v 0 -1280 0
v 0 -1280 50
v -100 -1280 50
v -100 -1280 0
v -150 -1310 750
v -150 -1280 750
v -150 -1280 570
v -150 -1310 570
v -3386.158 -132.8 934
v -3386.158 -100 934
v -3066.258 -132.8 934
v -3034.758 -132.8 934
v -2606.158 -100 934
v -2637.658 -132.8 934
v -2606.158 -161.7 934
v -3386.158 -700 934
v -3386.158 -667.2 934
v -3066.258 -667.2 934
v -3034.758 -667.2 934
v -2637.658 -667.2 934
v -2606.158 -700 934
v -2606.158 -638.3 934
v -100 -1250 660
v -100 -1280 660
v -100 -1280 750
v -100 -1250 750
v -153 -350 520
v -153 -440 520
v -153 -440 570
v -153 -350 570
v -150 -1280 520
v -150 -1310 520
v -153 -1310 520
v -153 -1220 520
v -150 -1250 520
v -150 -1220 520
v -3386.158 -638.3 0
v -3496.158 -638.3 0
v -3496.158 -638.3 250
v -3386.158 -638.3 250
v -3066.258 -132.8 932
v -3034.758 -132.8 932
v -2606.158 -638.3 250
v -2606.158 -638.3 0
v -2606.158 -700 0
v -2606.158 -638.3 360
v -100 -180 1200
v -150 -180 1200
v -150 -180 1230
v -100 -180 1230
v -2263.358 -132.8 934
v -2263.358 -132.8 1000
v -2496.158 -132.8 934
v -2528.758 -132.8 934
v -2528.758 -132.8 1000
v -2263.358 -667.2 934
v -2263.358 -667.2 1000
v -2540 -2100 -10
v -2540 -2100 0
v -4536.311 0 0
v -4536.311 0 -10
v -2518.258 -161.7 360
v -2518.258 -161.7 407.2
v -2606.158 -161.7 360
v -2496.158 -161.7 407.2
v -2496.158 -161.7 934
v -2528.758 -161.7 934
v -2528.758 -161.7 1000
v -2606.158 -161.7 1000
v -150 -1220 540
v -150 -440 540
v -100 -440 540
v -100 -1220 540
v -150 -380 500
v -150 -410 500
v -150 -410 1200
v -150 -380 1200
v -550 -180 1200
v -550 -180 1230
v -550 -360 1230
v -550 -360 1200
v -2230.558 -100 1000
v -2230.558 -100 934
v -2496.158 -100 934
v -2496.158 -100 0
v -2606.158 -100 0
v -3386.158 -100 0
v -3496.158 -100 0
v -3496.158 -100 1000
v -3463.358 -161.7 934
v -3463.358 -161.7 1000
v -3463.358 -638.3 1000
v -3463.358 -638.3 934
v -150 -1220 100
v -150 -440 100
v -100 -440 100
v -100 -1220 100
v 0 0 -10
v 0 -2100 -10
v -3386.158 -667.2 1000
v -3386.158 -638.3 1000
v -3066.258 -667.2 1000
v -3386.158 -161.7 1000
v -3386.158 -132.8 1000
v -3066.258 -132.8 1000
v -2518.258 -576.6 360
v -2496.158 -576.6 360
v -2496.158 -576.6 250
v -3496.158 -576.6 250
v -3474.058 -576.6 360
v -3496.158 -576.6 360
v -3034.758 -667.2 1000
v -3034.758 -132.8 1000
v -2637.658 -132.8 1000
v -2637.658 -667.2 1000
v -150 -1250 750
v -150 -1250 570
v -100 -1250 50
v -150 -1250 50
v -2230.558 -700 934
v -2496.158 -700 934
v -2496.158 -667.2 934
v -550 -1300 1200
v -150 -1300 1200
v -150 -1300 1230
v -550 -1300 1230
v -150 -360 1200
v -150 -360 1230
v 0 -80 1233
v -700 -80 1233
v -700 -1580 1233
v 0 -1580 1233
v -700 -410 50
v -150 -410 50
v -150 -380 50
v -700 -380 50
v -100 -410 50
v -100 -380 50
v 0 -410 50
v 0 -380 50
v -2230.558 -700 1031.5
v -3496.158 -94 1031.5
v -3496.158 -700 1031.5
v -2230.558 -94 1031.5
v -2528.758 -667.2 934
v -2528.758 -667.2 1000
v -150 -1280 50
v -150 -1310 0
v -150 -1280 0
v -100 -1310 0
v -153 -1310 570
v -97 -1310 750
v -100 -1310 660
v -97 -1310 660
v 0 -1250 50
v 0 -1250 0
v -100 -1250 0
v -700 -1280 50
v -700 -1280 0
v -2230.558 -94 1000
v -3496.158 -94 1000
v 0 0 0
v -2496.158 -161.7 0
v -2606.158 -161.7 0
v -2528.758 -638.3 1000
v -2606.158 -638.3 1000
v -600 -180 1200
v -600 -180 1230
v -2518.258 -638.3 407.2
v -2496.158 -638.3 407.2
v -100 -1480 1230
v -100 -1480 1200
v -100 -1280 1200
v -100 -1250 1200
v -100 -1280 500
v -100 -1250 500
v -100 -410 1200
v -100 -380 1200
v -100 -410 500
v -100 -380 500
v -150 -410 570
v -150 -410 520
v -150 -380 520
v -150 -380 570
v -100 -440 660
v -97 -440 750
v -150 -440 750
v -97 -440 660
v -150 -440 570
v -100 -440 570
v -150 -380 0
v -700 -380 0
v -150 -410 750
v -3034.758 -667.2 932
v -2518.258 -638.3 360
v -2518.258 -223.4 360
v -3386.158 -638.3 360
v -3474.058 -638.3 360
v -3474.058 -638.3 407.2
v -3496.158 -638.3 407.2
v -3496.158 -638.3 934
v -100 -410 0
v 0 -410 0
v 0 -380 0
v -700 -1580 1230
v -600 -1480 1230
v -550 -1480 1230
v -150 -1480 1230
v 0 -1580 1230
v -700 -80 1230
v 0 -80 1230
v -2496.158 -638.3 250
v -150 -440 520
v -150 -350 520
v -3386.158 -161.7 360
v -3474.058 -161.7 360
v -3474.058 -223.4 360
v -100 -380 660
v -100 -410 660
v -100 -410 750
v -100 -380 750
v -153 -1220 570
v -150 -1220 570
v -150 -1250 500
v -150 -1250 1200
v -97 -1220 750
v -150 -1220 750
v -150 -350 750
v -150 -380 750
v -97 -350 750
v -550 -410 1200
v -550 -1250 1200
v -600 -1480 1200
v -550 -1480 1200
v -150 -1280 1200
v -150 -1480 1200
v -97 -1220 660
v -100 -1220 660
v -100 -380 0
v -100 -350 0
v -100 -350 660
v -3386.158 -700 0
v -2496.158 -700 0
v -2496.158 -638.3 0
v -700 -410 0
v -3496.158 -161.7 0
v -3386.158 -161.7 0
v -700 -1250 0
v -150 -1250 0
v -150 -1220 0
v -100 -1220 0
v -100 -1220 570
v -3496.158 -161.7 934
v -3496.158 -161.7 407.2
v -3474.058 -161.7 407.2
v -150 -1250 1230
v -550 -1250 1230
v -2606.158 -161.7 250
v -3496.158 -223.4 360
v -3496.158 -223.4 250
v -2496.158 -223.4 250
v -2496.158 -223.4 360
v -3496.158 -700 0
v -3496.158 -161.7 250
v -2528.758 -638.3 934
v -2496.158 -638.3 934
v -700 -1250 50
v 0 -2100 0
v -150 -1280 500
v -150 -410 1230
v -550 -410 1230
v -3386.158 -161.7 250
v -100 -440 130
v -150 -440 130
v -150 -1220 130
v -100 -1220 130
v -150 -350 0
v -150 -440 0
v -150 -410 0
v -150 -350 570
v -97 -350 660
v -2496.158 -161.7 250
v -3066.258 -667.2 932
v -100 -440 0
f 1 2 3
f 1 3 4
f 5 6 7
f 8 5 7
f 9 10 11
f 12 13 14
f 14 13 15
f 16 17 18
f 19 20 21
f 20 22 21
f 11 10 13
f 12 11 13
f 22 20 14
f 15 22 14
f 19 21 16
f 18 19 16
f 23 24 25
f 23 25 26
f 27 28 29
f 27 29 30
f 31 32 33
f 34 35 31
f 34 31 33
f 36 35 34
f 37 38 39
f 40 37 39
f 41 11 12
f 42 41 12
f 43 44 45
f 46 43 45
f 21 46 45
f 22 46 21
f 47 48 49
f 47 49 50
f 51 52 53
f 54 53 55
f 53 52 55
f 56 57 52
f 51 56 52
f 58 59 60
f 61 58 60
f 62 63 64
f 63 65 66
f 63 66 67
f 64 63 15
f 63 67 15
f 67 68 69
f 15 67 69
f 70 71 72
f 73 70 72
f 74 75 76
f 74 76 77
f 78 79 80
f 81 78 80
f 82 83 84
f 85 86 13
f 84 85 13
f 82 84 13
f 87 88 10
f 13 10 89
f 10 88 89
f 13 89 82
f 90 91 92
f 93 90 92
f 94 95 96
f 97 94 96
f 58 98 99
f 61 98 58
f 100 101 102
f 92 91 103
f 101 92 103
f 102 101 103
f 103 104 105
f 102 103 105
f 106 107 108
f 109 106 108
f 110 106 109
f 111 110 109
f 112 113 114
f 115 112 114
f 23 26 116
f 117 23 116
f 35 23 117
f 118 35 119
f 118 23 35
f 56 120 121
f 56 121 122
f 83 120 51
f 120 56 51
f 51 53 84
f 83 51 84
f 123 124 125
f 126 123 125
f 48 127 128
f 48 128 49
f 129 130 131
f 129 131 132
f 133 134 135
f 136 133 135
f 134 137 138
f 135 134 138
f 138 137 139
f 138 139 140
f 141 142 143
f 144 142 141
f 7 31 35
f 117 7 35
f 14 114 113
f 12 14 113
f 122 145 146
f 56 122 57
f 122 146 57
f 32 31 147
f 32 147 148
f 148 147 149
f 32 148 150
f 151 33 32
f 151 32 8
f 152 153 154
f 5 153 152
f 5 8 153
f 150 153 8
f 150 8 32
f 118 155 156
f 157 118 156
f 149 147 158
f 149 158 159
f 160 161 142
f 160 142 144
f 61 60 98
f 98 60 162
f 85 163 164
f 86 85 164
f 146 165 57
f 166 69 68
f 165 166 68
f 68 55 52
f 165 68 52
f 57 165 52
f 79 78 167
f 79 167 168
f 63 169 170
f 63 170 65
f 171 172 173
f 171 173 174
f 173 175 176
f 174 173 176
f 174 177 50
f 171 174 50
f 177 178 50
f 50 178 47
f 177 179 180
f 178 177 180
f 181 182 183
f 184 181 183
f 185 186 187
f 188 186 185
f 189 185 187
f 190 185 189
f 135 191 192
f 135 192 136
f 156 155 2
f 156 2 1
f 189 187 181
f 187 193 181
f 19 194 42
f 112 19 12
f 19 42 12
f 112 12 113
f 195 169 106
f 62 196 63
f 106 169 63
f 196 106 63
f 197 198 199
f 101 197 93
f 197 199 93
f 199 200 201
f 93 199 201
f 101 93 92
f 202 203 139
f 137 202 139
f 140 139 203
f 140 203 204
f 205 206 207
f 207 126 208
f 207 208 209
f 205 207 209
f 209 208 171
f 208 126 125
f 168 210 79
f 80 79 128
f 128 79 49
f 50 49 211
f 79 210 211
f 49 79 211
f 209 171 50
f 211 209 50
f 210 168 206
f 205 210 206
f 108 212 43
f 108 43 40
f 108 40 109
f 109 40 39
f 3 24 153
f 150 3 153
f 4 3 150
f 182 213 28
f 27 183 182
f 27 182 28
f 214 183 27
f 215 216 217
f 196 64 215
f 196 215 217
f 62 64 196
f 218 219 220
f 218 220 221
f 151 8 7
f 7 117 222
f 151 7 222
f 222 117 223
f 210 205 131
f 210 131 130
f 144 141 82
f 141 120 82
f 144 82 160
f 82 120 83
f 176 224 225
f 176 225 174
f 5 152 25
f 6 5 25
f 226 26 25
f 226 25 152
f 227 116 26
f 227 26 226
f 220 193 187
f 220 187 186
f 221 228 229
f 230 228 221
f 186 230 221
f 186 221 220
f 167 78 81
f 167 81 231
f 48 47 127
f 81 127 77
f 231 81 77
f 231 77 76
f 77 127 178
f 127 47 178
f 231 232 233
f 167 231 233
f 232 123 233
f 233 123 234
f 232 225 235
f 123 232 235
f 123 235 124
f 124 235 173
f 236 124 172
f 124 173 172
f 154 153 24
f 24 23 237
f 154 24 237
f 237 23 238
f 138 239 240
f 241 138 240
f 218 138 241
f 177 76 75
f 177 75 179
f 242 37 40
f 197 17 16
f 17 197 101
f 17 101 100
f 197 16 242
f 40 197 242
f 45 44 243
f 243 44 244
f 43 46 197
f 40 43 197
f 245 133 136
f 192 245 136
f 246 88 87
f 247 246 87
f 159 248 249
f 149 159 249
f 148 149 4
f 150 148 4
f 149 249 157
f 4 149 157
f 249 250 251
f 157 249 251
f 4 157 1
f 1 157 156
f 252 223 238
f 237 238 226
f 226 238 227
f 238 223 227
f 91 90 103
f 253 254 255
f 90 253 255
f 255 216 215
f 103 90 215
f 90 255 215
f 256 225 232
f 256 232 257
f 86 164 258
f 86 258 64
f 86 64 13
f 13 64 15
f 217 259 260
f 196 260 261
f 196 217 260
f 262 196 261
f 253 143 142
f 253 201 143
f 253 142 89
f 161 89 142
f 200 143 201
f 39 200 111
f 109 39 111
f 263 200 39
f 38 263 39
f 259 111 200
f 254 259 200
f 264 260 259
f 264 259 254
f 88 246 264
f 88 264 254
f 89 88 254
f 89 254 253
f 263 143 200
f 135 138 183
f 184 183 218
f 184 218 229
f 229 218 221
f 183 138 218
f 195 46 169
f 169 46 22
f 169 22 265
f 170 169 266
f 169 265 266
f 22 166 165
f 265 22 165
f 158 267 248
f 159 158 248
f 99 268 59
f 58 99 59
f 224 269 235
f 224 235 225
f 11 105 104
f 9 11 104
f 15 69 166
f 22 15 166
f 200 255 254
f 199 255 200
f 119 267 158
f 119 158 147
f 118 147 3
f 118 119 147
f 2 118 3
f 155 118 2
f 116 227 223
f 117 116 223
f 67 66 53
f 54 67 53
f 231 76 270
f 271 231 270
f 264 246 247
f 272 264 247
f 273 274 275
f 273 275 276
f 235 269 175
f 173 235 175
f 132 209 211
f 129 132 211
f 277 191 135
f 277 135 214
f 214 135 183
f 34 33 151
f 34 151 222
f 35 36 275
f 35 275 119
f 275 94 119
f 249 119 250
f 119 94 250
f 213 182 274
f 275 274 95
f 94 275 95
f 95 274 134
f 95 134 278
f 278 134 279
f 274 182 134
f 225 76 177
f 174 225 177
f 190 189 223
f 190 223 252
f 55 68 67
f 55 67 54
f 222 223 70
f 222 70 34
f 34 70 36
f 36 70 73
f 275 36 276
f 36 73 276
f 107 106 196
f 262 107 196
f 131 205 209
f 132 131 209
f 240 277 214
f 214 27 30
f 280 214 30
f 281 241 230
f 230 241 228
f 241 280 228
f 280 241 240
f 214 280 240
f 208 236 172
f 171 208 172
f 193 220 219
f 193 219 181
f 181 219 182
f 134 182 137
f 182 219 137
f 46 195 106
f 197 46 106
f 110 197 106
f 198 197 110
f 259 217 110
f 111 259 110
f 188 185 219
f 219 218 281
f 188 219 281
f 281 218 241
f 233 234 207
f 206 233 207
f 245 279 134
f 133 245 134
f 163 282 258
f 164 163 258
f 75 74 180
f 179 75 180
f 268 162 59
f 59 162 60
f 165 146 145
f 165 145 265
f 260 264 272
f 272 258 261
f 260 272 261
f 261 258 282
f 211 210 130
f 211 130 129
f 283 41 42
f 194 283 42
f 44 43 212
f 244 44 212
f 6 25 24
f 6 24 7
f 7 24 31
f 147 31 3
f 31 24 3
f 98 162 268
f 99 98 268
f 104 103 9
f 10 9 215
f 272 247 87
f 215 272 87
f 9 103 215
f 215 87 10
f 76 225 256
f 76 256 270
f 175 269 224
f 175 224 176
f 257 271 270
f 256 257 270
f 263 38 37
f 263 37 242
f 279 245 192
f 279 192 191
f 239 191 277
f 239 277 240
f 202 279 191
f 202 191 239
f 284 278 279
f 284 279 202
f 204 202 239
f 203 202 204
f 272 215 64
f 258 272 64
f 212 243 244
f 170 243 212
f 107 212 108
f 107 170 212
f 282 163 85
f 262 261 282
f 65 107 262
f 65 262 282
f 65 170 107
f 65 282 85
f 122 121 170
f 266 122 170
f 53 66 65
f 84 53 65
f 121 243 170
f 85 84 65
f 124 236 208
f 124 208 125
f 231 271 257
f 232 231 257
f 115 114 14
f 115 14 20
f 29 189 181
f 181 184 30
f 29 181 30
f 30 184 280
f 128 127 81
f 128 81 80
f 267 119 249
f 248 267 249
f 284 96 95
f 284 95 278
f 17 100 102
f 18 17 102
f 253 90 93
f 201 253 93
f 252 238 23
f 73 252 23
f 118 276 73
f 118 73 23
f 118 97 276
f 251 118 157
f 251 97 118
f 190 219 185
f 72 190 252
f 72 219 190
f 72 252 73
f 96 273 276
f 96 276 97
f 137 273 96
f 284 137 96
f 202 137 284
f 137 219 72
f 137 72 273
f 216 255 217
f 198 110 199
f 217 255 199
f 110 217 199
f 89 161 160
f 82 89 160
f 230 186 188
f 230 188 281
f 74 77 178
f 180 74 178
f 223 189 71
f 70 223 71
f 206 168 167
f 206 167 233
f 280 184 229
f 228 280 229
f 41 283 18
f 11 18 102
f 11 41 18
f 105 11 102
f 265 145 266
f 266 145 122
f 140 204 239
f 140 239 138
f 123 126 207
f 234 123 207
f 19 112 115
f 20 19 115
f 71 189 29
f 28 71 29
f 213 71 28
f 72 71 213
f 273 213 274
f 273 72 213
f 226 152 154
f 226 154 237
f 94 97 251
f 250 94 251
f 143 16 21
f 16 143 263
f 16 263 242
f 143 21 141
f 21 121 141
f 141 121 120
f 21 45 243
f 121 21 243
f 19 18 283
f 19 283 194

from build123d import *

# Parameters (mm, degrees)
PAD015_DEPTH    = 10
SKETCH001_W     = 30
SKETCH001_H     = 50
PAD_DEPTH       = 700
SKETCH002_W     = 750
SKETCH002_H     = 50
PAD001_DEPTH    = 30
SKETCH003_W     = 750
SKETCH003_H     = 50
PAD002_DEPTH    = 30
SKETCH004_W     = 30
SKETCH004_H     = 50
PAD003_DEPTH    = 780
SKETCH005_W     = 750
SKETCH005_H     = 50
PAD004_DEPTH    = 30
SKETCH006_W     = 50
SKETCH006_H     = 700
PAD005_DEPTH    = 30
SKETCH007_W     = 750
SKETCH007_H     = 50
PAD006_DEPTH    = 30
SKETCH008_W     = 90
SKETCH008_H     = 50
PAD007_DEPTH    = 3
SKETCH009_W     = 90
SKETCH009_H     = 90
PAD008_DEPTH    = 3
SKETCH010_W     = 50
SKETCH010_H     = 30
PAD009_DEPTH    = 700
SKETCH011_W     = 50
SKETCH011_H     = 1300
PAD010_DEPTH    = 30
SKETCH012_W     = 50
SKETCH012_H     = 30
PAD011_DEPTH    = 700
SKETCH013_W     = 50
SKETCH013_H     = 30
PAD012_DEPTH    = 400
SKETCH014_W     = 1300
SKETCH014_H     = 30
PAD013_DEPTH    = 50
SKETCH015_W     = 700
SKETCH015_H     = 1500
PAD014_DEPTH    = 3
SKETCH016_W     = 110
SKETCH016_H     = 61.7
PAD016_DEPTH    = 1000
SKETCH017_W     = 1000
SKETCH017_H     = 110
PAD017_DEPTH    = 61.7
SKETCH018_W     = 110
SKETCH018_H     = 1000
PAD018_DEPTH    = 61.7
SKETCH019_W     = 61.7
SKETCH019_H     = 47.2
POCKET_DEPTH    = 22.1
SKETCH020_W     = 600
SKETCH020_H     = 47.2
PAD019_DEPTH    = 22.1
SKETCH021_W     = 61.7
SKETCH021_H     = 1000
PAD020_DEPTH    = 110
SKETCH022_W     = 1000
SKETCH022_H     = 110
PAD021_DEPTH    = 61.7
SKETCH023_W     = 110
SKETCH023_H     = 1000
PAD022_DEPTH    = 61.7
SKETCH024_W     = 61.7
SKETCH024_H     = 47.2
POCKET001_DEPTH = 22.1
SKETCH025_W     = 600
SKETCH025_H     = 47.2
PAD023_DEPTH    = 22.1
SKETCH026_W     = 61.7
SKETCH026_H     = 66
POCKET002_DEPTH = 32.8
SKETCH027_W     = 61.7
SKETCH027_H     = 66
POCKET003_DEPTH = 32.6
SKETCH028_W     = 77.2
SKETCH028_H     = 66
SKETCH028_W_2   = 77.4
POCKET004_DEPTH = 32.8
SKETCH029_W     = 77.4
SKETCH029_H     = 66
SKETCH029_W_2   = 77.2
POCKET005_DEPTH = 32.8
SKETCH030_W     = 600
SKETCH030_H     = 66
PAD024_DEPTH    = 32.8
SKETCH032_W     = 1200
SKETCH032_H     = 66
PAD025_DEPTH    = 32.8
SKETCH033_W     = 1200
SKETCH033_H     = 66
PAD026_DEPTH    = 32.8
SKETCH034_W     = 600
SKETCH034_H     = 66
PAD027_DEPTH    = 32.8
SKETCH035_W     = 534.4
SKETCH035_H     = 66
PAD028_DEPTH    = 31.5
SKETCH036_W     = 31.5
SKETCH036_H     = 68
PAD029_DEPTH    = 534.4
SKETCH037_W     = 1265.6
SKETCH037_H     = 606
PAD030_DEPTH    = 31.5


with BuildPart() as area:
    # Sketch → Pad015 (new body)
    with BuildSketch(Plane.XY):
        Polygon((0, -2100), (-2540, -2100), (-4536.311388, 0), (0, 0), align=None)
    extrude(amount=-PAD015_DEPTH)


with BuildPart() as partedebaixo:
    # Sketch001 → Pad (new body)
    with BuildSketch(Plane.YZ):
        with Locations((-395, 25)):
            Rectangle(SKETCH001_W, SKETCH001_H)
    extrude(amount=-PAD_DEPTH)

    # Sketch002 (on Face4 of Pad) → Pad001 (join)
    with BuildSketch(Plane(origin=(0, -410, 0), x_dir=(0, 0, -1), z_dir=(0, -1, 0))):
        with Locations((-375, -125)):
            Rectangle(SKETCH002_W, SKETCH002_H)
    extrude(amount=PAD001_DEPTH)

    # Sketch003 (on Face5 of Pad001) → Pad002 (join)
    with BuildSketch(Plane.ZX.offset(-380)):
        with Locations((375, -125)):
            Rectangle(SKETCH003_W, SKETCH003_H)
    extrude(amount=PAD002_DEPTH)

    # Sketch004 (on Face18 of Pad002) → Pad003 (join)
    with BuildSketch(Plane(origin=(0, -440, 0), x_dir=(0, 0, -1), z_dir=(0, -1, 0))):
        with Locations((-115, -125)):
            Rectangle(SKETCH004_W, SKETCH004_H)
        with Locations((-555, -125)):
            Rectangle(SKETCH004_W, SKETCH004_H)
    extrude(amount=PAD003_DEPTH)

    # Sketch005 (on Face29 of Pad003) → Pad004 (join)
    with BuildSketch(Plane(origin=(0, -1220, 0), x_dir=(0, 0, -1), z_dir=(0, -1, 0))):
        with Locations((-375, -125)):
            Rectangle(SKETCH005_W, SKETCH005_H)
    extrude(amount=PAD004_DEPTH)

    # Sketch006 (on Face9 of Pad004) → Pad005 (join)
    with BuildSketch(Plane(origin=(0, -1250, 0), x_dir=(0, 0, -1), z_dir=(0, -1, 0))):
        with Locations((-25, -350)):
            Rectangle(SKETCH006_W, SKETCH006_H)
    extrude(amount=PAD005_DEPTH)

    # Sketch007 (on Face24 of Pad005) → Pad006 (join)
    with BuildSketch(Plane(origin=(0, -1280, 0), x_dir=(0, 0, -1), z_dir=(0, -1, 0))):
        with Locations((-375, -125)):
            Rectangle(SKETCH007_W, SKETCH007_H)
    extrude(amount=PAD006_DEPTH)

    # Sketch008 (on Face50 of Pad006) → Pad007 (join)
    with BuildSketch(Plane(origin=(-150, 0, 0), x_dir=(0, 1, 0), z_dir=(-1, 0, 0))):
        with Locations((-1265, -545)):
            Rectangle(SKETCH008_W, SKETCH008_H)
        with Locations((-395, -545)):
            Rectangle(SKETCH008_W, SKETCH008_H)
    extrude(amount=PAD007_DEPTH)

    # Sketch009 (on Face45 of Pad007) → Pad008 (join)
    with BuildSketch(Plane.YZ.offset(-100)):
        with Locations((-1265, 705)):
            Rectangle(SKETCH009_W, SKETCH009_H)
        with Locations((-395, 705)):
            Rectangle(SKETCH009_W, SKETCH009_H)
    extrude(amount=PAD008_DEPTH)


with BuildPart() as partedecima:
    # Sketch010 → Pad009 (new body)
    with BuildSketch(Plane.XY.offset(500)):
        with Locations((-125, -395)):
            Rectangle(SKETCH010_W, SKETCH010_H)
    extrude(amount=PAD009_DEPTH)

    # Sketch011 (on Face6 of Pad009) → Pad010 (join)
    with BuildSketch(Plane.XY.offset(1200)):
        with Locations((-125, -830)):
            Rectangle(SKETCH011_W, SKETCH011_H)
    extrude(amount=PAD010_DEPTH)

    # Sketch012 (on Face7 of Pad010) → Pad011 (join)
    with BuildSketch(Plane(origin=(0, 0, 1200), x_dir=(1, 0, 0), z_dir=(0, 0, -1))):
        with Locations((-125, 1265)):
            Rectangle(SKETCH012_W, SKETCH012_H)
    extrude(amount=PAD011_DEPTH)

    # Sketch013 (on Face2 of Pad011) → Pad012 (join)
    with BuildSketch(Plane(origin=(-150, 0, 0), x_dir=(0, -1, 0), z_dir=(-1, 0, 0))):
        with Locations((385, 1215)):
            Rectangle(SKETCH013_W, SKETCH013_H)
        with Locations((1275, 1215)):
            Rectangle(SKETCH013_W, SKETCH013_H)
    extrude(amount=PAD012_DEPTH)

    # Sketch014 (on Face18 of Pad012) → Pad013 (join)
    with BuildSketch(Plane(origin=(-550, 0, 0), x_dir=(0, -1, 0), z_dir=(-1, 0, 0))):
        with Locations((830, 1215)):
            Rectangle(SKETCH014_W, SKETCH014_H)
    extrude(amount=PAD013_DEPTH)

    # Sketch015 (on Face1 of Pad013) → Pad014 (join)
    with BuildSketch(Plane.XY.offset(1230)):
        with Locations((-350, -830)):
            Rectangle(SKETCH015_W, SKETCH015_H)
    extrude(amount=PAD014_DEPTH)


with BuildPart() as bancada:
    # Sketch016 → Pad016 (new body)
    with BuildSketch(Plane.XY):
        with Locations((-3441.157551, -130.85)):
            Rectangle(SKETCH016_W, SKETCH016_H)
    extrude(amount=PAD016_DEPTH)

    # Sketch017 (on Face3 of Pad016) → Pad017 (join)
    with BuildSketch(Plane.XZ.offset(161.7)):
        with Locations((-2996.157551, 305)):
            Rectangle(SKETCH017_W, SKETCH017_H)
    extrude(amount=PAD017_DEPTH)

    # Sketch018 (on Face9 of Pad017) → Pad018 (join)
    with BuildSketch(Plane(origin=(0, -161.7, 0), x_dir=(-1, 0, 0), z_dir=(0, 1, 0))):
        with Locations((2551.157551, 500)):
            Rectangle(SKETCH018_W, SKETCH018_H)
    extrude(amount=PAD018_DEPTH)

    # Sketch019 (on Face2 of Pad018) → Pocket (cut)
    with BuildSketch(Plane(origin=(-3496.157551, 0, 0), x_dir=(0, -1, 0), z_dir=(-1, 0, 0))):
        with Locations((130.85, 383.6)):
            Rectangle(SKETCH019_W, SKETCH019_H)
    extrude(amount=-POCKET_DEPTH, mode=Mode.SUBTRACT)

    # Sketch020 (on Face7 of Pocket) → Pad019 (join)
    with BuildSketch(Plane(origin=(-3474.057551, 0, 0), x_dir=(0, -1, 0), z_dir=(-1, 0, 0))):
        with Locations((400, 383.6)):
            Rectangle(SKETCH020_W, SKETCH020_H)
    extrude(amount=PAD019_DEPTH)

    # Sketch021 (on Face11 of Pad019) → Pad020 (join)
    with BuildSketch(Plane(origin=(-3496.157551, 0, 0), x_dir=(0, -1, 0), z_dir=(-1, 0, 0))):
        with Locations((669.15, 500)):
            Rectangle(SKETCH021_W, SKETCH021_H)
    extrude(amount=-PAD020_DEPTH)

    # Sketch022 (on Face27 of Pad020) → Pad021 (join)
    with BuildSketch(Plane(origin=(0, -638.3, 0), x_dir=(-1, 0, 0), z_dir=(0, 1, 0))):
        with Locations((2996.157551, 305)):
            Rectangle(SKETCH022_W, SKETCH022_H)
    extrude(amount=PAD021_DEPTH)

    # Sketch023 (on Face36 of Pad021) → Pad022 (join)
    with BuildSketch(Plane.XZ.offset(638.3)):
        with Locations((-2551.157551, 500)):
            Rectangle(SKETCH023_W, SKETCH023_H)
    extrude(amount=PAD022_DEPTH)

    # Sketch024 (on Face46 of Pad022) → Pocket001 (cut)
    with BuildSketch(Plane.YZ.offset(-2496.157551)):
        with Locations((-669.15, 383.6)):
            Rectangle(SKETCH024_W, SKETCH024_H)
        with Locations((-130.85, 383.6)):
            Rectangle(SKETCH024_W, SKETCH024_H)
    extrude(amount=-POCKET001_DEPTH, mode=Mode.SUBTRACT)

    # Sketch025 (on Face52 of Pocket001) → Pad023 (join)
    with BuildSketch(Plane.YZ.offset(-2518.257551)):
        with Locations((-400, 383.6)):
            Rectangle(SKETCH025_W, SKETCH025_H)
    extrude(amount=PAD023_DEPTH)

    # Sketch026 (on Face5 of Pad023) → Pocket002 (cut)
    with BuildSketch(Plane(origin=(-3496.157551, 0, 0), x_dir=(0, -1, 0), z_dir=(-1, 0, 0))):
        with Locations((130.85, 967)):
            Rectangle(SKETCH026_W, SKETCH026_H)
        with Locations((669.15, 967)):
            Rectangle(SKETCH026_W, SKETCH026_H)
    extrude(amount=-POCKET002_DEPTH, mode=Mode.SUBTRACT)

    # Sketch027 (on Face55 of Pocket002) → Pocket003 (cut)
    with BuildSketch(Plane.YZ.offset(-2496.157551)):
        with Locations((-669.15, 967)):
            Rectangle(SKETCH027_W, SKETCH027_H)
        with Locations((-130.85, 967)):
            Rectangle(SKETCH027_W, SKETCH027_H)
    extrude(amount=-POCKET003_DEPTH, mode=Mode.SUBTRACT)

    # Sketch028 (on Face56 of Pocket003) → Pocket004 (cut)
    with BuildSketch(Plane.XZ.offset(700)):
        with Locations((-3424.757551, 967)):
            Rectangle(SKETCH028_W, SKETCH028_H)
        with Locations((-2567.457551, 967)):
            Rectangle(SKETCH028_W_2, SKETCH028_H)
    extrude(amount=-POCKET004_DEPTH, mode=Mode.SUBTRACT)

    # Sketch029 (on Face29 of Pocket004) → Pocket005 (cut)
    with BuildSketch(Plane(origin=(0, -100, 0), x_dir=(-1, 0, 0), z_dir=(0, 1, 0))):
        with Locations((2567.457551, 967)):
            Rectangle(SKETCH029_W, SKETCH029_H)
        with Locations((3424.757551, 967)):
            Rectangle(SKETCH029_W_2, SKETCH029_H)
    extrude(amount=-POCKET005_DEPTH, mode=Mode.SUBTRACT)

    # Sketch030 (on Face14 of Pocket005) → Pad024 (join)
    with BuildSketch(Plane(origin=(-3463.357551, 0, 0), x_dir=(0, -1, 0), z_dir=(-1, 0, 0))):
        with Locations((400, 967)):
            Rectangle(SKETCH030_W, SKETCH030_H)
    extrude(amount=PAD024_DEPTH)

    # Sketch032 (on Face13 of Pad024) → Pad025 (join)
    with BuildSketch(Plane(origin=(0, -132.8, 0), x_dir=(-1, 0, 0), z_dir=(0, 1, 0))):
        with Locations((2863.357551, 967)):
            Rectangle(SKETCH032_W, SKETCH032_H)
    extrude(amount=PAD025_DEPTH)

    # Sketch033 (on Face79 of Pad025) → Pad026 (join)
    with BuildSketch(Plane.XZ.offset(667.2)):
        with Locations((-2863.357551, 967)):
            Rectangle(SKETCH033_W, SKETCH033_H)
    extrude(amount=PAD026_DEPTH)

    # Sketch034 (on Face56 of Pad026) → Pad027 (join)
    with BuildSketch(Plane.YZ.offset(-2263.357551)):
        with Locations((-400, 967)):
            Rectangle(SKETCH034_W, SKETCH034_H)
    extrude(amount=PAD027_DEPTH)

    # Sketch035 (on Face24 of Pad027) → Pad028 (join)
    with BuildSketch(Plane(origin=(-2606.157551, 0, 0), x_dir=(0, -1, 0), z_dir=(-1, 0, 0))):
        with Locations((400, 967)):
            Rectangle(SKETCH035_W, SKETCH035_H)
    extrude(amount=PAD028_DEPTH)

    # Sketch036 (on Face13 of Pad028) → Pad029 (join)
    with BuildSketch(Plane.XZ.offset(132.8)):
        with Locations((-3050.507551, 966)):
            Rectangle(SKETCH036_W, SKETCH036_H)
    extrude(amount=PAD029_DEPTH)

    # Sketch037 (on Face19 of Pad029) → Pad030 (join)
    with BuildSketch(Plane.XY.offset(1000)):
        with Locations((-2863.357551, -397)):
            Rectangle(SKETCH037_W, SKETCH037_H)
    extrude(amount=PAD030_DEPTH)


solid = Compound([area.part, partedebaixo.part, partedecima.part, bancada.part])
